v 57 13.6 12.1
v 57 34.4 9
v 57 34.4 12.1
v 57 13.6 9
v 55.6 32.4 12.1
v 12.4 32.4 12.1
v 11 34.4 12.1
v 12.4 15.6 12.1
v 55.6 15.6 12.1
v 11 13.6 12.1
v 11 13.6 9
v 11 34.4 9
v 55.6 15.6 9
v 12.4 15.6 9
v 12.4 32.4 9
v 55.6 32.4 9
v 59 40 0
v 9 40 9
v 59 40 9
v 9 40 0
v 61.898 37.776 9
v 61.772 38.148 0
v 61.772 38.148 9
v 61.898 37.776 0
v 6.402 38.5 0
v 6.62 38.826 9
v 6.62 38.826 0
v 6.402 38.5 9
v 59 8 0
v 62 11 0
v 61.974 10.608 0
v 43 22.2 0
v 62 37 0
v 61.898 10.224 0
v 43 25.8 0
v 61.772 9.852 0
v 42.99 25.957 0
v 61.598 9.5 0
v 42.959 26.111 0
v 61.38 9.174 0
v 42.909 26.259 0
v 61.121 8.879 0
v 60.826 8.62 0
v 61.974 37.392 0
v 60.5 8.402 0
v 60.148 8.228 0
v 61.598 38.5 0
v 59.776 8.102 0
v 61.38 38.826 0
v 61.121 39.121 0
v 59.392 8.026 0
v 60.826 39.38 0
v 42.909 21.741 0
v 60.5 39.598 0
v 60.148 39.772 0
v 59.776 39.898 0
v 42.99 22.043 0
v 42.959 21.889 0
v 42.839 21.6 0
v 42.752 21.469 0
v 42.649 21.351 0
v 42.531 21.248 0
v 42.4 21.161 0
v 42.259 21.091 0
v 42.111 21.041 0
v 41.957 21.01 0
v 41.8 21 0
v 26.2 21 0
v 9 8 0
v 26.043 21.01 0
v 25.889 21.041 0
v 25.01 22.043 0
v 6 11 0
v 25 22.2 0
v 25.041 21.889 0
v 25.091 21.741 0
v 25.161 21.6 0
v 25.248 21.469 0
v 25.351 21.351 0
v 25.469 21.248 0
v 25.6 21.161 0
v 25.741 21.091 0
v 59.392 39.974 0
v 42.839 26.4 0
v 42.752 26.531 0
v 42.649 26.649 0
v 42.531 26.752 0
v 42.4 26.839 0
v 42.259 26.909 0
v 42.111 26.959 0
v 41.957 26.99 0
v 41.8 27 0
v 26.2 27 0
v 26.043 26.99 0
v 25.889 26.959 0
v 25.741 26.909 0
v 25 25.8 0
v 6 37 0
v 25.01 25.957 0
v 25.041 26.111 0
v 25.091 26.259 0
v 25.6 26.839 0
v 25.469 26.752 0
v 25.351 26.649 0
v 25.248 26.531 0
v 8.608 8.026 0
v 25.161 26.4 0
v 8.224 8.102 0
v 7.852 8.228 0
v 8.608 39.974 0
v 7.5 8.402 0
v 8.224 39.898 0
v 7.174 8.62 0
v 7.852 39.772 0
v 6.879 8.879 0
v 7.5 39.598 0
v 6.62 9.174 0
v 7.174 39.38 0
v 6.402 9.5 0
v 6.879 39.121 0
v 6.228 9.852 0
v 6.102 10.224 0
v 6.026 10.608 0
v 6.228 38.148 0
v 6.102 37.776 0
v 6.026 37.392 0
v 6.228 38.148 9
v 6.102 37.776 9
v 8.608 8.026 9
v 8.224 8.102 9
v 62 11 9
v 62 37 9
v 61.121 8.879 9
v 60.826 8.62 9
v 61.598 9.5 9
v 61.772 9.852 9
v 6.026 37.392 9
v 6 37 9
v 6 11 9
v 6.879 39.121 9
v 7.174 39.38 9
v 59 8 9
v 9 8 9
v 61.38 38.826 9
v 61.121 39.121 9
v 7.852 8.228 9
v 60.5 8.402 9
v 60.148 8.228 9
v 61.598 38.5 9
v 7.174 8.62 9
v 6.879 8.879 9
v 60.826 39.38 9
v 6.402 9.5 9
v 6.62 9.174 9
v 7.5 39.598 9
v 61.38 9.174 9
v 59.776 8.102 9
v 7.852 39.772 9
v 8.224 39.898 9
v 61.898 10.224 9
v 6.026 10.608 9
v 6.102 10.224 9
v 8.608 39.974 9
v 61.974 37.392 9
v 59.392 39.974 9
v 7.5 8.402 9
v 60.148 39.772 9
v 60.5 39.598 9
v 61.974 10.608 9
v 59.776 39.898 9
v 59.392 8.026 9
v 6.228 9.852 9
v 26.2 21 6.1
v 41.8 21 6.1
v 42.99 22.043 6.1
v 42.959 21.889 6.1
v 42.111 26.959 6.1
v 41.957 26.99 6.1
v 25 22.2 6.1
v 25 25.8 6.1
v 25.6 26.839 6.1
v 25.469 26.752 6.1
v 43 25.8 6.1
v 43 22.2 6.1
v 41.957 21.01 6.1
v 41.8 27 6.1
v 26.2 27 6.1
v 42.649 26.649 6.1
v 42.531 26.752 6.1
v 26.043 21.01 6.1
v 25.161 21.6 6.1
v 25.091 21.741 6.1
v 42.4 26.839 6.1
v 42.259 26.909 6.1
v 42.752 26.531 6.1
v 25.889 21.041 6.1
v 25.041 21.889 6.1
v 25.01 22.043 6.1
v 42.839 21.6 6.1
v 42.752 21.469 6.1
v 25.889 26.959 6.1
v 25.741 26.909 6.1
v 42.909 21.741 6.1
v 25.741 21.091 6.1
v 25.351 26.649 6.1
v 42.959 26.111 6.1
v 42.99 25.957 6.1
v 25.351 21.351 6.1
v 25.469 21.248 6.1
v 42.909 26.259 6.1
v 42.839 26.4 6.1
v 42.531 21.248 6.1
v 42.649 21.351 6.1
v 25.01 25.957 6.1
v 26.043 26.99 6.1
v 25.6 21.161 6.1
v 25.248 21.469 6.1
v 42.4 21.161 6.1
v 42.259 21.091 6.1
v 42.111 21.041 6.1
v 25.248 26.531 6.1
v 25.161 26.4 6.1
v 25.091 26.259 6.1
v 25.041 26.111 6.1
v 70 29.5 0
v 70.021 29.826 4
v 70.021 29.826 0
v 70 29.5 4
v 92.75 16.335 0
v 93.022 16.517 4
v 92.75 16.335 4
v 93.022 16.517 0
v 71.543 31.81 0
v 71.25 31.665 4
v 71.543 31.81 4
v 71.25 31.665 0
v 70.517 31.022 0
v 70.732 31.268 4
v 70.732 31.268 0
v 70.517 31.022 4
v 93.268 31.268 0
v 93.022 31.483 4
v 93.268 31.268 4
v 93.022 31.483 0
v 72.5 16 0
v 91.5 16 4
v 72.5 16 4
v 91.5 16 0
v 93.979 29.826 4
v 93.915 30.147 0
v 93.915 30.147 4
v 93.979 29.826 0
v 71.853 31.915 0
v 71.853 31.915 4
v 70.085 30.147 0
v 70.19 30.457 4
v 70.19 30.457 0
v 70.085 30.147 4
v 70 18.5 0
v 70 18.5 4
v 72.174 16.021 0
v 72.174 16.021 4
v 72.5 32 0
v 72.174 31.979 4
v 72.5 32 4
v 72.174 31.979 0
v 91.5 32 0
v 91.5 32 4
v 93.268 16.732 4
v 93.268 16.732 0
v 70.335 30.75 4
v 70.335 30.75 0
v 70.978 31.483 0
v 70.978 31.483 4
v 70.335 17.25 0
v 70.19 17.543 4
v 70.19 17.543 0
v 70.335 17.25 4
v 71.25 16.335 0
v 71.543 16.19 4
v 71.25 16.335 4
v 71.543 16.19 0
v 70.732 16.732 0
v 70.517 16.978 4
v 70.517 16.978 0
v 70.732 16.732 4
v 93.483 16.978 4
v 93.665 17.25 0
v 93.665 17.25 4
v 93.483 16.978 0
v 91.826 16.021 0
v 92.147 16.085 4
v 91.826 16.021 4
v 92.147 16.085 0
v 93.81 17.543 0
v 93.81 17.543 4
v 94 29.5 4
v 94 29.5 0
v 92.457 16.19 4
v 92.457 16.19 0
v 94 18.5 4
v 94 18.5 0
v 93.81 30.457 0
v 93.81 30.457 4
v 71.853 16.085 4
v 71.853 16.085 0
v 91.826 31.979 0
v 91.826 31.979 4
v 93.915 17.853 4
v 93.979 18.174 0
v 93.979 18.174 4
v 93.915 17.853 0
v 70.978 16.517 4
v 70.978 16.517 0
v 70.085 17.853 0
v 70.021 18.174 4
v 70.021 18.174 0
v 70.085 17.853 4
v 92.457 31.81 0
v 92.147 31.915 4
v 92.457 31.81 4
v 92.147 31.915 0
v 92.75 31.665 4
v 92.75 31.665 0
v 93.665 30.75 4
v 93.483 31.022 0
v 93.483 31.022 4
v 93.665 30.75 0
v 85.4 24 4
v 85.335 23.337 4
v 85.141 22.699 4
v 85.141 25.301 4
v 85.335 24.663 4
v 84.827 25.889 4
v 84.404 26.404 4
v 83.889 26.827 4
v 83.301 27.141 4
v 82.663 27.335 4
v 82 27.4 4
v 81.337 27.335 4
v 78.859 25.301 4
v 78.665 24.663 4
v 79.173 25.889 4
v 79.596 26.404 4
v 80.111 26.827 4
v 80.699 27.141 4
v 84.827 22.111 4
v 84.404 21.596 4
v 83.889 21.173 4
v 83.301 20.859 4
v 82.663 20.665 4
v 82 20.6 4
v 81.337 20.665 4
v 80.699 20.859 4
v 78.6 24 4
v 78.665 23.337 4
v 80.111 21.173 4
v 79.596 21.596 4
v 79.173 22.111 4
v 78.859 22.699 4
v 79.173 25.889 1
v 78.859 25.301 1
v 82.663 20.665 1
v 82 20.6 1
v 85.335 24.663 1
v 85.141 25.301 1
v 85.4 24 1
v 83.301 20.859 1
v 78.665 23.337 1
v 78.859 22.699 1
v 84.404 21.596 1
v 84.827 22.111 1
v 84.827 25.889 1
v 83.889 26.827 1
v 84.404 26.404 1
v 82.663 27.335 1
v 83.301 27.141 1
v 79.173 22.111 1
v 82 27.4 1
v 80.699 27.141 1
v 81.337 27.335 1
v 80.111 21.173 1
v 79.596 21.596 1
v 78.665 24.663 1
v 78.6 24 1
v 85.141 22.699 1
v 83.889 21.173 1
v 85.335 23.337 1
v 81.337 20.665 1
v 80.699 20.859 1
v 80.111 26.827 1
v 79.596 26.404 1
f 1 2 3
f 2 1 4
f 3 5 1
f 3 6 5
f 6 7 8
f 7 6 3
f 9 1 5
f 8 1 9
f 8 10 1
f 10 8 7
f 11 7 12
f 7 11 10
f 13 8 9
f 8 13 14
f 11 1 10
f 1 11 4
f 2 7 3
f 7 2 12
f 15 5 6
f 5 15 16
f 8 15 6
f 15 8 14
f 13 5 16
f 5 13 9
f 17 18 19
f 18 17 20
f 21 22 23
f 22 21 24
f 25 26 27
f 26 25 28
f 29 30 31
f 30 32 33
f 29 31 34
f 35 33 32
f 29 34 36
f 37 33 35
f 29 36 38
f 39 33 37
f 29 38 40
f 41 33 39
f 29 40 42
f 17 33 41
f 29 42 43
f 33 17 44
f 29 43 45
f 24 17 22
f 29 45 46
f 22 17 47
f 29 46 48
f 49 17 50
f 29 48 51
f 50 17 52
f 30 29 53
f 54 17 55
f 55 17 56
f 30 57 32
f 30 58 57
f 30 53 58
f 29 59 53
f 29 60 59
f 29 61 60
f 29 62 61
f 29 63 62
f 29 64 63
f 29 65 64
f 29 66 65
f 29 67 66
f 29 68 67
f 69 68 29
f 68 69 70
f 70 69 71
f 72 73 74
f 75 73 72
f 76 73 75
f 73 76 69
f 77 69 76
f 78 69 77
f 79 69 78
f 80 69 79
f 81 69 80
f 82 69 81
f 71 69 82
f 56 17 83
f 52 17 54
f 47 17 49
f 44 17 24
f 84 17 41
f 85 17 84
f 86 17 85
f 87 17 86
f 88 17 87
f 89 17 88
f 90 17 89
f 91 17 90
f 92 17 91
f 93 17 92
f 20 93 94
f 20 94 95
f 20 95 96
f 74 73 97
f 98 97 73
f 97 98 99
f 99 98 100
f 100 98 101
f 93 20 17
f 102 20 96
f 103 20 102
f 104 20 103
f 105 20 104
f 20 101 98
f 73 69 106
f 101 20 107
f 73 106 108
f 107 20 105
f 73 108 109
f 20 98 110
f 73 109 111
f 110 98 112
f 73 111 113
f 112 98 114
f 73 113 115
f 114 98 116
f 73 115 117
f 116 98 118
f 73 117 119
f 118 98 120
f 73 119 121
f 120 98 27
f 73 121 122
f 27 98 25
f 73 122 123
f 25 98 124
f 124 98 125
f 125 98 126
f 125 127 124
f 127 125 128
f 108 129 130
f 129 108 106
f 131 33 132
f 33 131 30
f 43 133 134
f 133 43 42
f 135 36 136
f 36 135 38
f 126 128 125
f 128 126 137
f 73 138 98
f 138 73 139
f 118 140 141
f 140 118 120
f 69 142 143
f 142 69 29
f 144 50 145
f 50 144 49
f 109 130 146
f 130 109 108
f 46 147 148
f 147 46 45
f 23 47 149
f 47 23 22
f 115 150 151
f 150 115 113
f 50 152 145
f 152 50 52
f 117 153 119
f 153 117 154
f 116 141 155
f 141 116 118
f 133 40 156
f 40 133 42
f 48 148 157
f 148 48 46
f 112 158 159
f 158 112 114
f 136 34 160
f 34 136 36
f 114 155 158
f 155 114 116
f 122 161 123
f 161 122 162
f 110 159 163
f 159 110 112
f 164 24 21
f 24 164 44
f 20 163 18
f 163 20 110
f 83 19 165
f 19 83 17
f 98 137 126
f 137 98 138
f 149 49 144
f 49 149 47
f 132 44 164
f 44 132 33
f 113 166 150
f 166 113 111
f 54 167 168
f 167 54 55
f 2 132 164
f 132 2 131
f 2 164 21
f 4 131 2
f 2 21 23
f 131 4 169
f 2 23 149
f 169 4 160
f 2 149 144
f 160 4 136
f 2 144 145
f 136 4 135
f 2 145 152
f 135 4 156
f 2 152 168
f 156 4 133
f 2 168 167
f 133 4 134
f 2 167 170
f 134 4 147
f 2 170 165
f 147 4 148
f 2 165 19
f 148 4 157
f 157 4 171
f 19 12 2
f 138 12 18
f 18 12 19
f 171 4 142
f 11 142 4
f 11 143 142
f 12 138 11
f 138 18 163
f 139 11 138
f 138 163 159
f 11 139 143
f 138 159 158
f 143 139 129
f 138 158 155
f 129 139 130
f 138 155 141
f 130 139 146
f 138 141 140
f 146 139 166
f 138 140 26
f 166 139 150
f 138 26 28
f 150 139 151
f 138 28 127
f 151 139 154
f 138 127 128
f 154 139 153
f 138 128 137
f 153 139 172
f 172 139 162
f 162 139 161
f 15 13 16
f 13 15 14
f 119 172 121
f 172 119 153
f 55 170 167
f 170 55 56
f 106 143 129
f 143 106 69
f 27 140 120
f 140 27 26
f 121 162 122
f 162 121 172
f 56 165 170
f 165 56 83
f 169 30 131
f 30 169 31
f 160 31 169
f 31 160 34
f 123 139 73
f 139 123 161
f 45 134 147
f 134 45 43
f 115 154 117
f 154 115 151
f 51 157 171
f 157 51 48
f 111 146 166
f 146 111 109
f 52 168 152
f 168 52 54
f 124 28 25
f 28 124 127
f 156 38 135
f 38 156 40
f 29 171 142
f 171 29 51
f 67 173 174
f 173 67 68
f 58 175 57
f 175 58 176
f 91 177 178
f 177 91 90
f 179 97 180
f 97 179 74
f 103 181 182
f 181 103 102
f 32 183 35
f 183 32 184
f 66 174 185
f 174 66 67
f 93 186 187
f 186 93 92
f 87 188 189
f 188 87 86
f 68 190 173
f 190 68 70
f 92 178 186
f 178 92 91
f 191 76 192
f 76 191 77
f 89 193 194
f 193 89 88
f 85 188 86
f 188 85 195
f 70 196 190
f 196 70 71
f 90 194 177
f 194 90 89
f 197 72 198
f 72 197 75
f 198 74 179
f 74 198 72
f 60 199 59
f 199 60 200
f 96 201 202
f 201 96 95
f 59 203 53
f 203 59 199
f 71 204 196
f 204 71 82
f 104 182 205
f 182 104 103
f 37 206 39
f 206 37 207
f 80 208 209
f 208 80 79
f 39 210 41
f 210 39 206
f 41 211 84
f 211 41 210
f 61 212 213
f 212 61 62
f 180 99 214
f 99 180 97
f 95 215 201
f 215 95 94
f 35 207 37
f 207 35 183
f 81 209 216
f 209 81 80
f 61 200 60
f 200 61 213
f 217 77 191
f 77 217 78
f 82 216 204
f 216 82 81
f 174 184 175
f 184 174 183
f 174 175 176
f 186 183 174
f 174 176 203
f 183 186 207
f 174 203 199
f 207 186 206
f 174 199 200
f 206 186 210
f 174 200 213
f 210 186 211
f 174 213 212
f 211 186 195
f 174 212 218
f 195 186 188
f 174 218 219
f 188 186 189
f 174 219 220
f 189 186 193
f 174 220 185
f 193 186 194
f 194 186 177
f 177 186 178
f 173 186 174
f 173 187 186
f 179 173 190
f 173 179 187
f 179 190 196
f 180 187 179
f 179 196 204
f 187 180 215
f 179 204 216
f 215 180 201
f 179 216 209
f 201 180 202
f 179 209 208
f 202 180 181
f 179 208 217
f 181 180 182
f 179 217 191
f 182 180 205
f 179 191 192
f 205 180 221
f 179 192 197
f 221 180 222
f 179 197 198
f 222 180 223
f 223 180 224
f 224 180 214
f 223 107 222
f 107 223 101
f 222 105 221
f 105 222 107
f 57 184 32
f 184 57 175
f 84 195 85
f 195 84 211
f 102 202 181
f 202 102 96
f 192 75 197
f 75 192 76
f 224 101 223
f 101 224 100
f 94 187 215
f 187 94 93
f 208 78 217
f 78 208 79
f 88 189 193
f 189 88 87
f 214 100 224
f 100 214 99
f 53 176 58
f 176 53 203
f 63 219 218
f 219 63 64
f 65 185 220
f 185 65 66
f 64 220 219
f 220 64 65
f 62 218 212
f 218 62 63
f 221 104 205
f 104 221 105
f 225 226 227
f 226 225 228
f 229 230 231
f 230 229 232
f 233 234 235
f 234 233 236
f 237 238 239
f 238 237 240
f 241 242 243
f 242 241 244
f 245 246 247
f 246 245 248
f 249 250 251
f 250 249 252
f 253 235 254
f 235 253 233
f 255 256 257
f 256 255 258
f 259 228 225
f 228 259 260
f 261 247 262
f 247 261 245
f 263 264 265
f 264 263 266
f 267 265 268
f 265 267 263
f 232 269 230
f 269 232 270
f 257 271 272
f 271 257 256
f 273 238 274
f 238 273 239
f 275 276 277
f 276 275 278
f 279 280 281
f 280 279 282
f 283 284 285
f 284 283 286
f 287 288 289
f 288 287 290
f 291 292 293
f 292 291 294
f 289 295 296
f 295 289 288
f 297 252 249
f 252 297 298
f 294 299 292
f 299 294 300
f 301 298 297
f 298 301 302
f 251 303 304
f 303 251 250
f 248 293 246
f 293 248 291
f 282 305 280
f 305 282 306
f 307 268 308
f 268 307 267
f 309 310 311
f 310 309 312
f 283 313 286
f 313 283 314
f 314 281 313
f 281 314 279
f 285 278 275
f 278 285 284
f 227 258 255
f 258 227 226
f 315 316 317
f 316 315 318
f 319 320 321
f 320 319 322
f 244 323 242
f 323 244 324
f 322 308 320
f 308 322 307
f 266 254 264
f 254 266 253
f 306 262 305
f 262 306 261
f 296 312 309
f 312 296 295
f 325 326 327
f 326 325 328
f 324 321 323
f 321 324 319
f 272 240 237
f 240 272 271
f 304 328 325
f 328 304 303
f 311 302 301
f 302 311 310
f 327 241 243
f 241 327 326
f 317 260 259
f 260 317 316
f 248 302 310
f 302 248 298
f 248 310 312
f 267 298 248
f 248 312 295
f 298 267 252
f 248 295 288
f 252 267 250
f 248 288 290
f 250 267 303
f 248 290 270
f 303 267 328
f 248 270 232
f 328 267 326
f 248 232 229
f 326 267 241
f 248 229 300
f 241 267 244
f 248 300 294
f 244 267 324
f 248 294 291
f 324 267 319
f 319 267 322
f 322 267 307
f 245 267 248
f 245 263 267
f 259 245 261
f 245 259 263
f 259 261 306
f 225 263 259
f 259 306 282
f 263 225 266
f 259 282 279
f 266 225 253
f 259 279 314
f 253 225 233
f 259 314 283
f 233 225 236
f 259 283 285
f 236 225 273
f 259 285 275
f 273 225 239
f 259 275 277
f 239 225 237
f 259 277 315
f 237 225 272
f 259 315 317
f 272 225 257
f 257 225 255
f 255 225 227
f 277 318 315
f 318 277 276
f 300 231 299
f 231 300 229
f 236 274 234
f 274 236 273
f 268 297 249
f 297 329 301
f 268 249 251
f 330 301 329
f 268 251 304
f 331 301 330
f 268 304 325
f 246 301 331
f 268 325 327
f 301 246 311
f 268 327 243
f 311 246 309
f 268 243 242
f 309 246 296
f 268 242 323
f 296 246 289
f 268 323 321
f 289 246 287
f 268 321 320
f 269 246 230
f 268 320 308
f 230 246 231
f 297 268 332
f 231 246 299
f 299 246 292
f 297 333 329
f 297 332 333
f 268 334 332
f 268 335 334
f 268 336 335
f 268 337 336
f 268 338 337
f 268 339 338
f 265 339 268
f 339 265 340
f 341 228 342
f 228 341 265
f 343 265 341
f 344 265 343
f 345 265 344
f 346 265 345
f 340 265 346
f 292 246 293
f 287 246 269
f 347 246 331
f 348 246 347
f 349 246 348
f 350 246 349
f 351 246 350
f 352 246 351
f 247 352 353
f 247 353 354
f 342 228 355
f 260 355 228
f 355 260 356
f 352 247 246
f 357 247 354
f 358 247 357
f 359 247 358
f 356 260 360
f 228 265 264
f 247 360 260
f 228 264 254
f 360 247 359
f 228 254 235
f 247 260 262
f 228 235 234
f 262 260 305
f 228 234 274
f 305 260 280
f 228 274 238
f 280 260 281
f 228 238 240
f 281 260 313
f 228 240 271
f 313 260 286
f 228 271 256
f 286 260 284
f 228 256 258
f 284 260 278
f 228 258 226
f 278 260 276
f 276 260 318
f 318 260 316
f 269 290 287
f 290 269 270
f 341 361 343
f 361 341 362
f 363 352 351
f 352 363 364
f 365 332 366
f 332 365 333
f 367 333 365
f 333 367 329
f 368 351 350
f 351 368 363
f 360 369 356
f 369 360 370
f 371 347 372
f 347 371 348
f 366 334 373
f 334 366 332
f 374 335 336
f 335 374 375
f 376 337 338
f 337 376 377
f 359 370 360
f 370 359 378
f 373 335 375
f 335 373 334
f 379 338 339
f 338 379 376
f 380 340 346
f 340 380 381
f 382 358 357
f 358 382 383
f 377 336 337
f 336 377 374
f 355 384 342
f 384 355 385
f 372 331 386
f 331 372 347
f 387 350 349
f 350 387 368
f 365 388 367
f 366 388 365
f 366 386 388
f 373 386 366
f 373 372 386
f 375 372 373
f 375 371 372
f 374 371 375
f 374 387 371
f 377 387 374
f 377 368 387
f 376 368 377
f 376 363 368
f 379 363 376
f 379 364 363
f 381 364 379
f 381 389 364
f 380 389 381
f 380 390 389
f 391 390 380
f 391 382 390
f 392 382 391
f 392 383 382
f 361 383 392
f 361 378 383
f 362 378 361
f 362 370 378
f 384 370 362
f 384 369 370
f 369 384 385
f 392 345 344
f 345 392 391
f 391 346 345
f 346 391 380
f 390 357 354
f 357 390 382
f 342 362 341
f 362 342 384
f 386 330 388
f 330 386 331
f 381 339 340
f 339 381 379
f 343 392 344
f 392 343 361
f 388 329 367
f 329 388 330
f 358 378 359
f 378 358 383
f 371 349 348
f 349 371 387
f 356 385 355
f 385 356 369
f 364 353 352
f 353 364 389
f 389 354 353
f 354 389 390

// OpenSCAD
/*
Sample 155: Abgedichtete Magnetbetätiger-Tasche — Wand 3 mm
Generated from the FDM Mechanical Sample Library.
Units: millimetres.

Override examples:
  openscad -o custom.stl -D 'view="plate"' -D 'render_fn=64' model.scad
  openscad -o preview.png -D 'view="assembly"' model.scad
*/
use <../../../library/fdm_mechanisms.scad>

render_fn = is_undef(render_fn) ? 48 : render_fn;
view = is_undef(view) ? "plate" : view;
$fn = render_fn;

sample_magnetic_actuator(
    view=view,
    wall_t=3,
    magnet_d=6,
    magnet_l=3,
    switch_keepout=[18, 6, 6],
    travel=22,
    retention=1.4,
    clearance=0.4
);
